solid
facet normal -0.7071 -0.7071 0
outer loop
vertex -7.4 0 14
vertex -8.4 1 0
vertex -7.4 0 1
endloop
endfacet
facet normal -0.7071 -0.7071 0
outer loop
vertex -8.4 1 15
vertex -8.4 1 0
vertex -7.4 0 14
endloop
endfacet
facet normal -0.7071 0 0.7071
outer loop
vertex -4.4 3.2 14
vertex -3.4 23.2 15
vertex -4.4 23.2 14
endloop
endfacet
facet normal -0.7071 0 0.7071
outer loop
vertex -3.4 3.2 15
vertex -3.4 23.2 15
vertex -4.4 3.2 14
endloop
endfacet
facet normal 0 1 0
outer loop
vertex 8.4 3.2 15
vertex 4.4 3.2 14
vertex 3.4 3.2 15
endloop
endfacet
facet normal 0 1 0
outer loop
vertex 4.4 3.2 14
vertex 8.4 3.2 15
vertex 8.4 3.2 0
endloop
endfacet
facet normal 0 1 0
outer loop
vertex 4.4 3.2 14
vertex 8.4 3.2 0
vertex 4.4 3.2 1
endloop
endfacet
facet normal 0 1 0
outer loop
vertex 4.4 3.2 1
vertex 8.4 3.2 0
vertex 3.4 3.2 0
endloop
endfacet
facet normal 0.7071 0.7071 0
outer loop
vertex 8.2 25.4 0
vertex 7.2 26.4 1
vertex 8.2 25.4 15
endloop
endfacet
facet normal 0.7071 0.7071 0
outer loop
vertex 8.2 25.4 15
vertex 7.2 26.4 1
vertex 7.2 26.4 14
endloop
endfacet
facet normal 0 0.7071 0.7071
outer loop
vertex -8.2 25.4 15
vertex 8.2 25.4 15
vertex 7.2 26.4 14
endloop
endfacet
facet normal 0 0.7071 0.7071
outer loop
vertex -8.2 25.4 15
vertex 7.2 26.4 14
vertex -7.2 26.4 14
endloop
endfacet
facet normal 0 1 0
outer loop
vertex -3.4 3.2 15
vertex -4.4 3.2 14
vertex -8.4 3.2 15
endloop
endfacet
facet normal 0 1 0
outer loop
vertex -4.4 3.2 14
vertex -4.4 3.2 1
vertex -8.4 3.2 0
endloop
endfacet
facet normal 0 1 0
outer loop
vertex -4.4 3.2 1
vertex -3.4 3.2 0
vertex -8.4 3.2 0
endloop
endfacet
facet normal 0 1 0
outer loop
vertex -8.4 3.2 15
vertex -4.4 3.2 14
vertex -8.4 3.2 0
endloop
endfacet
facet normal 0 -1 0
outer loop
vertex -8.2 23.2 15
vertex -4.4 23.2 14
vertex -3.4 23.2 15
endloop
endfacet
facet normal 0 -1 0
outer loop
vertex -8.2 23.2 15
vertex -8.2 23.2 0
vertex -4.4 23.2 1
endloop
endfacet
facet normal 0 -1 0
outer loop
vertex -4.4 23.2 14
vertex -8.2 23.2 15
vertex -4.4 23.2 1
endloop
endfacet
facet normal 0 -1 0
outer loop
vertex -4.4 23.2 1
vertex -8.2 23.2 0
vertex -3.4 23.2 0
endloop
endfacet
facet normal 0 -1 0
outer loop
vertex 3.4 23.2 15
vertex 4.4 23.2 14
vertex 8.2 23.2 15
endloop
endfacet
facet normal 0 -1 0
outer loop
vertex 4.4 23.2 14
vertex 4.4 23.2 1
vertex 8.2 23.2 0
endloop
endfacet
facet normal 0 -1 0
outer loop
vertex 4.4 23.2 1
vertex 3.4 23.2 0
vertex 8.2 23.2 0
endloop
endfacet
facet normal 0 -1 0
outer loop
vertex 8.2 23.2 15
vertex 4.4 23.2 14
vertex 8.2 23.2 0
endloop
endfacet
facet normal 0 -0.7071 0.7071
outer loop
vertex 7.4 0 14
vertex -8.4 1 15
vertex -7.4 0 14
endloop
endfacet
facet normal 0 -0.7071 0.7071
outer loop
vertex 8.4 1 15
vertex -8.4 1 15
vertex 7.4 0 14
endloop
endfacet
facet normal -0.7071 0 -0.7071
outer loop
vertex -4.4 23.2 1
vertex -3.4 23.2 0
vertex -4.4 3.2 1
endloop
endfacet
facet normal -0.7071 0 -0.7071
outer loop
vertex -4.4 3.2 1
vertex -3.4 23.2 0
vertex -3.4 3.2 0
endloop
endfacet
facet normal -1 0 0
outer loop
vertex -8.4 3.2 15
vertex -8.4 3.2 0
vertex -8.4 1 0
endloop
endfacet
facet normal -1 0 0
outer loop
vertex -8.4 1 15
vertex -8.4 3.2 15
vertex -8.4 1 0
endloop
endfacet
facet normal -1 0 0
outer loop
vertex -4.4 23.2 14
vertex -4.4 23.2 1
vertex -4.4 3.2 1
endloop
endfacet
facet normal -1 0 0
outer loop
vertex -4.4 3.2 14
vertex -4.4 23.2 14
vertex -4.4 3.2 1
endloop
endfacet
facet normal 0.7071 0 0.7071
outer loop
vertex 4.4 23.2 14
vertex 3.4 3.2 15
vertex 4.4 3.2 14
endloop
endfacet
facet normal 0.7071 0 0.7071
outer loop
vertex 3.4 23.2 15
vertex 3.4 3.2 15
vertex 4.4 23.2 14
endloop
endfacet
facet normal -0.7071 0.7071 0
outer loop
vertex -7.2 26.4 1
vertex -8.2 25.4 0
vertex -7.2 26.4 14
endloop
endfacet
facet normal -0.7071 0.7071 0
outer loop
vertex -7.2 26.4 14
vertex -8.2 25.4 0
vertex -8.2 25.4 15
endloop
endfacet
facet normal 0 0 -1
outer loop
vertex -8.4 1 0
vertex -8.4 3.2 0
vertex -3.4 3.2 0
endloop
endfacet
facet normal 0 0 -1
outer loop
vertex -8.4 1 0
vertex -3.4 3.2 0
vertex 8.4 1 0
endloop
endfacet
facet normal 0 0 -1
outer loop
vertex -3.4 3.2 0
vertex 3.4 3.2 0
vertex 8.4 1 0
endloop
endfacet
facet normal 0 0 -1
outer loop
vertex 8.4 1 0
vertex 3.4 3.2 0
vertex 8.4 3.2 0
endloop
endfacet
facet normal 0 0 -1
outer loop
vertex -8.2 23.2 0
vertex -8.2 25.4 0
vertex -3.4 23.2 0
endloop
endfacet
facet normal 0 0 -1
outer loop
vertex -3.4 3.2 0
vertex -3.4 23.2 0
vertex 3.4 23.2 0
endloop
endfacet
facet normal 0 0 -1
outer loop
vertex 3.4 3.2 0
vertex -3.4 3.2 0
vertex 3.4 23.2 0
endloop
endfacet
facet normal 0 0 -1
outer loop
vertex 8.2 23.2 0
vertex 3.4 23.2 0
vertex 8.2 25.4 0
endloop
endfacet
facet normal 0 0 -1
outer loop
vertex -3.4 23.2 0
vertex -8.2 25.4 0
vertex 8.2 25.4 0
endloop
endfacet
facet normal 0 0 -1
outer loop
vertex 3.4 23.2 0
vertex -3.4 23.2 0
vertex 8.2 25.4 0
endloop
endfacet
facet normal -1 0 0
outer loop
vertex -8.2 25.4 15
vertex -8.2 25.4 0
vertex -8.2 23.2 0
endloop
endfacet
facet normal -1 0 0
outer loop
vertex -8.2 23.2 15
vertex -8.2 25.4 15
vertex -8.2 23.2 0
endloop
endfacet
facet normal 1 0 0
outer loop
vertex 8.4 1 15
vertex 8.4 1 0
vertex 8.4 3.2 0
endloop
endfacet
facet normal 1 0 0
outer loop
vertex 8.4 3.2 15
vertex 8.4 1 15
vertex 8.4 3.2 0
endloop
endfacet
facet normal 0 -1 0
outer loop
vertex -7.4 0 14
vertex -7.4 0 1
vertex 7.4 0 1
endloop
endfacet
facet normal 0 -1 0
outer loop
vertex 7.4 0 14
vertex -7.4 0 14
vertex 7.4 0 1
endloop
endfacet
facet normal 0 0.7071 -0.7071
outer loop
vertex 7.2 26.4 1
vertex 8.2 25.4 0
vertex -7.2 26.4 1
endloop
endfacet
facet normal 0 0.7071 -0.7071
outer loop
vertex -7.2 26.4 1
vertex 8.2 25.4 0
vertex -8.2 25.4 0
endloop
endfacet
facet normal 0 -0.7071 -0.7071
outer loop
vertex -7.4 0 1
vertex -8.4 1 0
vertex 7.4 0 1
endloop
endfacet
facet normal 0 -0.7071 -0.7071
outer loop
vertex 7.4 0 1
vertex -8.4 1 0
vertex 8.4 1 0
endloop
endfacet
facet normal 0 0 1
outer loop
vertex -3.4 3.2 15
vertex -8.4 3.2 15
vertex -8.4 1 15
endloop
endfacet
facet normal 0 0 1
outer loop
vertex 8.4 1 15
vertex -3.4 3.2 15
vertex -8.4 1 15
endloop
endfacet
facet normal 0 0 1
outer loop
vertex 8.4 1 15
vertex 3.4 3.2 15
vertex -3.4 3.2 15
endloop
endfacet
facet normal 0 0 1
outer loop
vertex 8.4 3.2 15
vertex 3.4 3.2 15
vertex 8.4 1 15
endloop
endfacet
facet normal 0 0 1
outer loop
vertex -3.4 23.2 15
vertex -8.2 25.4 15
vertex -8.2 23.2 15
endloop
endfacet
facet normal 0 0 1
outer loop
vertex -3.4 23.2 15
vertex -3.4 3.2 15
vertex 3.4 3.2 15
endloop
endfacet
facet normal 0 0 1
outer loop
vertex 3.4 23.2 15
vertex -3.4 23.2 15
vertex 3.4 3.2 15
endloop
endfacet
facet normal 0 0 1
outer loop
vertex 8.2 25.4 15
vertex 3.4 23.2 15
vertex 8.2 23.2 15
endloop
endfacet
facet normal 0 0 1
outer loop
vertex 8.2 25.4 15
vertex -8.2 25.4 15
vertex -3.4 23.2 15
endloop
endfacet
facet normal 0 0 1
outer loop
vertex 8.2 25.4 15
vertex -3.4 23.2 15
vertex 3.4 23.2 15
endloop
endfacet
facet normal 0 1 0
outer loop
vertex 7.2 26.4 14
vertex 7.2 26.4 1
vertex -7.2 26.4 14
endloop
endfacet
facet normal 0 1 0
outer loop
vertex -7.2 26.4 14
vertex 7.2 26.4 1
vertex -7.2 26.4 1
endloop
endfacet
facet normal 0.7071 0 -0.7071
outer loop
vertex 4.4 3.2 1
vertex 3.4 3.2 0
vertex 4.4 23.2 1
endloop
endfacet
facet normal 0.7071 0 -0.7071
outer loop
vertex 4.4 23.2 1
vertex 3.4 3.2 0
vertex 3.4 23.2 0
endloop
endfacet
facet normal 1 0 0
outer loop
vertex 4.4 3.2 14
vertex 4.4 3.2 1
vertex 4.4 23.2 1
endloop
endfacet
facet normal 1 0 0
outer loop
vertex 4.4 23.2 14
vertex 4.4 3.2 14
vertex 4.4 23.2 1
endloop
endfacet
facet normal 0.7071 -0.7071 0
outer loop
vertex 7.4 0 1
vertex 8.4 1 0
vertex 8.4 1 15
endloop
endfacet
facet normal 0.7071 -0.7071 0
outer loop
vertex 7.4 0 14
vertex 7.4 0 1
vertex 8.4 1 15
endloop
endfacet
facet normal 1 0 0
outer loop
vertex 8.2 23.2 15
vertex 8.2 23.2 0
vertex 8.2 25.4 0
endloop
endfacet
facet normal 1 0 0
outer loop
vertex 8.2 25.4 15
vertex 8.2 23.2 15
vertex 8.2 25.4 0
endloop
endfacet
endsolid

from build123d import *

# Parameters (mm, degrees)
EXTRUDE_1_DEPTH = 15
CHAMFER_1_SIZE  = 1


with BuildPart() as part:
    # 스케치1 → 보스-돌출1 (new body)
    with BuildSketch(Plane.XY):
        Polygon((-8.4, 0), (8.4, 0), (8.4, 3.2), (4.4, 3.2), (4.4, 23.2), (8.2, 23.2), (8.2, 26.4), (-8.2, 26.4), (-8.2, 23.2), (-4.4, 23.2), (-4.4, 3.2), (-8.4, 3.2), align=None)
    extrude(amount=EXTRUDE_1_DEPTH)

    # 모따기1
    chamfer_1_edges = [part.edges().sort_by_distance(p)[0] for p in [
        (4.4, 13.2, 0),
        (0, 0, 0),
        (-4.4, 13.2, 0),
        (0, 26.4, 0),
        (-4.4, 13.2, 15),
        (8.4, 0, 7.5),
        (-8.4, 0, 7.5),
        (-8.2, 26.4, 7.5),
        (8.2, 26.4, 7.5),
        (0, 0, 15),
        (4.4, 13.2, 15),
        (0, 26.4, 15),
    ]]
    chamfer(chamfer_1_edges, length=CHAMFER_1_SIZE)


solid = part.part
